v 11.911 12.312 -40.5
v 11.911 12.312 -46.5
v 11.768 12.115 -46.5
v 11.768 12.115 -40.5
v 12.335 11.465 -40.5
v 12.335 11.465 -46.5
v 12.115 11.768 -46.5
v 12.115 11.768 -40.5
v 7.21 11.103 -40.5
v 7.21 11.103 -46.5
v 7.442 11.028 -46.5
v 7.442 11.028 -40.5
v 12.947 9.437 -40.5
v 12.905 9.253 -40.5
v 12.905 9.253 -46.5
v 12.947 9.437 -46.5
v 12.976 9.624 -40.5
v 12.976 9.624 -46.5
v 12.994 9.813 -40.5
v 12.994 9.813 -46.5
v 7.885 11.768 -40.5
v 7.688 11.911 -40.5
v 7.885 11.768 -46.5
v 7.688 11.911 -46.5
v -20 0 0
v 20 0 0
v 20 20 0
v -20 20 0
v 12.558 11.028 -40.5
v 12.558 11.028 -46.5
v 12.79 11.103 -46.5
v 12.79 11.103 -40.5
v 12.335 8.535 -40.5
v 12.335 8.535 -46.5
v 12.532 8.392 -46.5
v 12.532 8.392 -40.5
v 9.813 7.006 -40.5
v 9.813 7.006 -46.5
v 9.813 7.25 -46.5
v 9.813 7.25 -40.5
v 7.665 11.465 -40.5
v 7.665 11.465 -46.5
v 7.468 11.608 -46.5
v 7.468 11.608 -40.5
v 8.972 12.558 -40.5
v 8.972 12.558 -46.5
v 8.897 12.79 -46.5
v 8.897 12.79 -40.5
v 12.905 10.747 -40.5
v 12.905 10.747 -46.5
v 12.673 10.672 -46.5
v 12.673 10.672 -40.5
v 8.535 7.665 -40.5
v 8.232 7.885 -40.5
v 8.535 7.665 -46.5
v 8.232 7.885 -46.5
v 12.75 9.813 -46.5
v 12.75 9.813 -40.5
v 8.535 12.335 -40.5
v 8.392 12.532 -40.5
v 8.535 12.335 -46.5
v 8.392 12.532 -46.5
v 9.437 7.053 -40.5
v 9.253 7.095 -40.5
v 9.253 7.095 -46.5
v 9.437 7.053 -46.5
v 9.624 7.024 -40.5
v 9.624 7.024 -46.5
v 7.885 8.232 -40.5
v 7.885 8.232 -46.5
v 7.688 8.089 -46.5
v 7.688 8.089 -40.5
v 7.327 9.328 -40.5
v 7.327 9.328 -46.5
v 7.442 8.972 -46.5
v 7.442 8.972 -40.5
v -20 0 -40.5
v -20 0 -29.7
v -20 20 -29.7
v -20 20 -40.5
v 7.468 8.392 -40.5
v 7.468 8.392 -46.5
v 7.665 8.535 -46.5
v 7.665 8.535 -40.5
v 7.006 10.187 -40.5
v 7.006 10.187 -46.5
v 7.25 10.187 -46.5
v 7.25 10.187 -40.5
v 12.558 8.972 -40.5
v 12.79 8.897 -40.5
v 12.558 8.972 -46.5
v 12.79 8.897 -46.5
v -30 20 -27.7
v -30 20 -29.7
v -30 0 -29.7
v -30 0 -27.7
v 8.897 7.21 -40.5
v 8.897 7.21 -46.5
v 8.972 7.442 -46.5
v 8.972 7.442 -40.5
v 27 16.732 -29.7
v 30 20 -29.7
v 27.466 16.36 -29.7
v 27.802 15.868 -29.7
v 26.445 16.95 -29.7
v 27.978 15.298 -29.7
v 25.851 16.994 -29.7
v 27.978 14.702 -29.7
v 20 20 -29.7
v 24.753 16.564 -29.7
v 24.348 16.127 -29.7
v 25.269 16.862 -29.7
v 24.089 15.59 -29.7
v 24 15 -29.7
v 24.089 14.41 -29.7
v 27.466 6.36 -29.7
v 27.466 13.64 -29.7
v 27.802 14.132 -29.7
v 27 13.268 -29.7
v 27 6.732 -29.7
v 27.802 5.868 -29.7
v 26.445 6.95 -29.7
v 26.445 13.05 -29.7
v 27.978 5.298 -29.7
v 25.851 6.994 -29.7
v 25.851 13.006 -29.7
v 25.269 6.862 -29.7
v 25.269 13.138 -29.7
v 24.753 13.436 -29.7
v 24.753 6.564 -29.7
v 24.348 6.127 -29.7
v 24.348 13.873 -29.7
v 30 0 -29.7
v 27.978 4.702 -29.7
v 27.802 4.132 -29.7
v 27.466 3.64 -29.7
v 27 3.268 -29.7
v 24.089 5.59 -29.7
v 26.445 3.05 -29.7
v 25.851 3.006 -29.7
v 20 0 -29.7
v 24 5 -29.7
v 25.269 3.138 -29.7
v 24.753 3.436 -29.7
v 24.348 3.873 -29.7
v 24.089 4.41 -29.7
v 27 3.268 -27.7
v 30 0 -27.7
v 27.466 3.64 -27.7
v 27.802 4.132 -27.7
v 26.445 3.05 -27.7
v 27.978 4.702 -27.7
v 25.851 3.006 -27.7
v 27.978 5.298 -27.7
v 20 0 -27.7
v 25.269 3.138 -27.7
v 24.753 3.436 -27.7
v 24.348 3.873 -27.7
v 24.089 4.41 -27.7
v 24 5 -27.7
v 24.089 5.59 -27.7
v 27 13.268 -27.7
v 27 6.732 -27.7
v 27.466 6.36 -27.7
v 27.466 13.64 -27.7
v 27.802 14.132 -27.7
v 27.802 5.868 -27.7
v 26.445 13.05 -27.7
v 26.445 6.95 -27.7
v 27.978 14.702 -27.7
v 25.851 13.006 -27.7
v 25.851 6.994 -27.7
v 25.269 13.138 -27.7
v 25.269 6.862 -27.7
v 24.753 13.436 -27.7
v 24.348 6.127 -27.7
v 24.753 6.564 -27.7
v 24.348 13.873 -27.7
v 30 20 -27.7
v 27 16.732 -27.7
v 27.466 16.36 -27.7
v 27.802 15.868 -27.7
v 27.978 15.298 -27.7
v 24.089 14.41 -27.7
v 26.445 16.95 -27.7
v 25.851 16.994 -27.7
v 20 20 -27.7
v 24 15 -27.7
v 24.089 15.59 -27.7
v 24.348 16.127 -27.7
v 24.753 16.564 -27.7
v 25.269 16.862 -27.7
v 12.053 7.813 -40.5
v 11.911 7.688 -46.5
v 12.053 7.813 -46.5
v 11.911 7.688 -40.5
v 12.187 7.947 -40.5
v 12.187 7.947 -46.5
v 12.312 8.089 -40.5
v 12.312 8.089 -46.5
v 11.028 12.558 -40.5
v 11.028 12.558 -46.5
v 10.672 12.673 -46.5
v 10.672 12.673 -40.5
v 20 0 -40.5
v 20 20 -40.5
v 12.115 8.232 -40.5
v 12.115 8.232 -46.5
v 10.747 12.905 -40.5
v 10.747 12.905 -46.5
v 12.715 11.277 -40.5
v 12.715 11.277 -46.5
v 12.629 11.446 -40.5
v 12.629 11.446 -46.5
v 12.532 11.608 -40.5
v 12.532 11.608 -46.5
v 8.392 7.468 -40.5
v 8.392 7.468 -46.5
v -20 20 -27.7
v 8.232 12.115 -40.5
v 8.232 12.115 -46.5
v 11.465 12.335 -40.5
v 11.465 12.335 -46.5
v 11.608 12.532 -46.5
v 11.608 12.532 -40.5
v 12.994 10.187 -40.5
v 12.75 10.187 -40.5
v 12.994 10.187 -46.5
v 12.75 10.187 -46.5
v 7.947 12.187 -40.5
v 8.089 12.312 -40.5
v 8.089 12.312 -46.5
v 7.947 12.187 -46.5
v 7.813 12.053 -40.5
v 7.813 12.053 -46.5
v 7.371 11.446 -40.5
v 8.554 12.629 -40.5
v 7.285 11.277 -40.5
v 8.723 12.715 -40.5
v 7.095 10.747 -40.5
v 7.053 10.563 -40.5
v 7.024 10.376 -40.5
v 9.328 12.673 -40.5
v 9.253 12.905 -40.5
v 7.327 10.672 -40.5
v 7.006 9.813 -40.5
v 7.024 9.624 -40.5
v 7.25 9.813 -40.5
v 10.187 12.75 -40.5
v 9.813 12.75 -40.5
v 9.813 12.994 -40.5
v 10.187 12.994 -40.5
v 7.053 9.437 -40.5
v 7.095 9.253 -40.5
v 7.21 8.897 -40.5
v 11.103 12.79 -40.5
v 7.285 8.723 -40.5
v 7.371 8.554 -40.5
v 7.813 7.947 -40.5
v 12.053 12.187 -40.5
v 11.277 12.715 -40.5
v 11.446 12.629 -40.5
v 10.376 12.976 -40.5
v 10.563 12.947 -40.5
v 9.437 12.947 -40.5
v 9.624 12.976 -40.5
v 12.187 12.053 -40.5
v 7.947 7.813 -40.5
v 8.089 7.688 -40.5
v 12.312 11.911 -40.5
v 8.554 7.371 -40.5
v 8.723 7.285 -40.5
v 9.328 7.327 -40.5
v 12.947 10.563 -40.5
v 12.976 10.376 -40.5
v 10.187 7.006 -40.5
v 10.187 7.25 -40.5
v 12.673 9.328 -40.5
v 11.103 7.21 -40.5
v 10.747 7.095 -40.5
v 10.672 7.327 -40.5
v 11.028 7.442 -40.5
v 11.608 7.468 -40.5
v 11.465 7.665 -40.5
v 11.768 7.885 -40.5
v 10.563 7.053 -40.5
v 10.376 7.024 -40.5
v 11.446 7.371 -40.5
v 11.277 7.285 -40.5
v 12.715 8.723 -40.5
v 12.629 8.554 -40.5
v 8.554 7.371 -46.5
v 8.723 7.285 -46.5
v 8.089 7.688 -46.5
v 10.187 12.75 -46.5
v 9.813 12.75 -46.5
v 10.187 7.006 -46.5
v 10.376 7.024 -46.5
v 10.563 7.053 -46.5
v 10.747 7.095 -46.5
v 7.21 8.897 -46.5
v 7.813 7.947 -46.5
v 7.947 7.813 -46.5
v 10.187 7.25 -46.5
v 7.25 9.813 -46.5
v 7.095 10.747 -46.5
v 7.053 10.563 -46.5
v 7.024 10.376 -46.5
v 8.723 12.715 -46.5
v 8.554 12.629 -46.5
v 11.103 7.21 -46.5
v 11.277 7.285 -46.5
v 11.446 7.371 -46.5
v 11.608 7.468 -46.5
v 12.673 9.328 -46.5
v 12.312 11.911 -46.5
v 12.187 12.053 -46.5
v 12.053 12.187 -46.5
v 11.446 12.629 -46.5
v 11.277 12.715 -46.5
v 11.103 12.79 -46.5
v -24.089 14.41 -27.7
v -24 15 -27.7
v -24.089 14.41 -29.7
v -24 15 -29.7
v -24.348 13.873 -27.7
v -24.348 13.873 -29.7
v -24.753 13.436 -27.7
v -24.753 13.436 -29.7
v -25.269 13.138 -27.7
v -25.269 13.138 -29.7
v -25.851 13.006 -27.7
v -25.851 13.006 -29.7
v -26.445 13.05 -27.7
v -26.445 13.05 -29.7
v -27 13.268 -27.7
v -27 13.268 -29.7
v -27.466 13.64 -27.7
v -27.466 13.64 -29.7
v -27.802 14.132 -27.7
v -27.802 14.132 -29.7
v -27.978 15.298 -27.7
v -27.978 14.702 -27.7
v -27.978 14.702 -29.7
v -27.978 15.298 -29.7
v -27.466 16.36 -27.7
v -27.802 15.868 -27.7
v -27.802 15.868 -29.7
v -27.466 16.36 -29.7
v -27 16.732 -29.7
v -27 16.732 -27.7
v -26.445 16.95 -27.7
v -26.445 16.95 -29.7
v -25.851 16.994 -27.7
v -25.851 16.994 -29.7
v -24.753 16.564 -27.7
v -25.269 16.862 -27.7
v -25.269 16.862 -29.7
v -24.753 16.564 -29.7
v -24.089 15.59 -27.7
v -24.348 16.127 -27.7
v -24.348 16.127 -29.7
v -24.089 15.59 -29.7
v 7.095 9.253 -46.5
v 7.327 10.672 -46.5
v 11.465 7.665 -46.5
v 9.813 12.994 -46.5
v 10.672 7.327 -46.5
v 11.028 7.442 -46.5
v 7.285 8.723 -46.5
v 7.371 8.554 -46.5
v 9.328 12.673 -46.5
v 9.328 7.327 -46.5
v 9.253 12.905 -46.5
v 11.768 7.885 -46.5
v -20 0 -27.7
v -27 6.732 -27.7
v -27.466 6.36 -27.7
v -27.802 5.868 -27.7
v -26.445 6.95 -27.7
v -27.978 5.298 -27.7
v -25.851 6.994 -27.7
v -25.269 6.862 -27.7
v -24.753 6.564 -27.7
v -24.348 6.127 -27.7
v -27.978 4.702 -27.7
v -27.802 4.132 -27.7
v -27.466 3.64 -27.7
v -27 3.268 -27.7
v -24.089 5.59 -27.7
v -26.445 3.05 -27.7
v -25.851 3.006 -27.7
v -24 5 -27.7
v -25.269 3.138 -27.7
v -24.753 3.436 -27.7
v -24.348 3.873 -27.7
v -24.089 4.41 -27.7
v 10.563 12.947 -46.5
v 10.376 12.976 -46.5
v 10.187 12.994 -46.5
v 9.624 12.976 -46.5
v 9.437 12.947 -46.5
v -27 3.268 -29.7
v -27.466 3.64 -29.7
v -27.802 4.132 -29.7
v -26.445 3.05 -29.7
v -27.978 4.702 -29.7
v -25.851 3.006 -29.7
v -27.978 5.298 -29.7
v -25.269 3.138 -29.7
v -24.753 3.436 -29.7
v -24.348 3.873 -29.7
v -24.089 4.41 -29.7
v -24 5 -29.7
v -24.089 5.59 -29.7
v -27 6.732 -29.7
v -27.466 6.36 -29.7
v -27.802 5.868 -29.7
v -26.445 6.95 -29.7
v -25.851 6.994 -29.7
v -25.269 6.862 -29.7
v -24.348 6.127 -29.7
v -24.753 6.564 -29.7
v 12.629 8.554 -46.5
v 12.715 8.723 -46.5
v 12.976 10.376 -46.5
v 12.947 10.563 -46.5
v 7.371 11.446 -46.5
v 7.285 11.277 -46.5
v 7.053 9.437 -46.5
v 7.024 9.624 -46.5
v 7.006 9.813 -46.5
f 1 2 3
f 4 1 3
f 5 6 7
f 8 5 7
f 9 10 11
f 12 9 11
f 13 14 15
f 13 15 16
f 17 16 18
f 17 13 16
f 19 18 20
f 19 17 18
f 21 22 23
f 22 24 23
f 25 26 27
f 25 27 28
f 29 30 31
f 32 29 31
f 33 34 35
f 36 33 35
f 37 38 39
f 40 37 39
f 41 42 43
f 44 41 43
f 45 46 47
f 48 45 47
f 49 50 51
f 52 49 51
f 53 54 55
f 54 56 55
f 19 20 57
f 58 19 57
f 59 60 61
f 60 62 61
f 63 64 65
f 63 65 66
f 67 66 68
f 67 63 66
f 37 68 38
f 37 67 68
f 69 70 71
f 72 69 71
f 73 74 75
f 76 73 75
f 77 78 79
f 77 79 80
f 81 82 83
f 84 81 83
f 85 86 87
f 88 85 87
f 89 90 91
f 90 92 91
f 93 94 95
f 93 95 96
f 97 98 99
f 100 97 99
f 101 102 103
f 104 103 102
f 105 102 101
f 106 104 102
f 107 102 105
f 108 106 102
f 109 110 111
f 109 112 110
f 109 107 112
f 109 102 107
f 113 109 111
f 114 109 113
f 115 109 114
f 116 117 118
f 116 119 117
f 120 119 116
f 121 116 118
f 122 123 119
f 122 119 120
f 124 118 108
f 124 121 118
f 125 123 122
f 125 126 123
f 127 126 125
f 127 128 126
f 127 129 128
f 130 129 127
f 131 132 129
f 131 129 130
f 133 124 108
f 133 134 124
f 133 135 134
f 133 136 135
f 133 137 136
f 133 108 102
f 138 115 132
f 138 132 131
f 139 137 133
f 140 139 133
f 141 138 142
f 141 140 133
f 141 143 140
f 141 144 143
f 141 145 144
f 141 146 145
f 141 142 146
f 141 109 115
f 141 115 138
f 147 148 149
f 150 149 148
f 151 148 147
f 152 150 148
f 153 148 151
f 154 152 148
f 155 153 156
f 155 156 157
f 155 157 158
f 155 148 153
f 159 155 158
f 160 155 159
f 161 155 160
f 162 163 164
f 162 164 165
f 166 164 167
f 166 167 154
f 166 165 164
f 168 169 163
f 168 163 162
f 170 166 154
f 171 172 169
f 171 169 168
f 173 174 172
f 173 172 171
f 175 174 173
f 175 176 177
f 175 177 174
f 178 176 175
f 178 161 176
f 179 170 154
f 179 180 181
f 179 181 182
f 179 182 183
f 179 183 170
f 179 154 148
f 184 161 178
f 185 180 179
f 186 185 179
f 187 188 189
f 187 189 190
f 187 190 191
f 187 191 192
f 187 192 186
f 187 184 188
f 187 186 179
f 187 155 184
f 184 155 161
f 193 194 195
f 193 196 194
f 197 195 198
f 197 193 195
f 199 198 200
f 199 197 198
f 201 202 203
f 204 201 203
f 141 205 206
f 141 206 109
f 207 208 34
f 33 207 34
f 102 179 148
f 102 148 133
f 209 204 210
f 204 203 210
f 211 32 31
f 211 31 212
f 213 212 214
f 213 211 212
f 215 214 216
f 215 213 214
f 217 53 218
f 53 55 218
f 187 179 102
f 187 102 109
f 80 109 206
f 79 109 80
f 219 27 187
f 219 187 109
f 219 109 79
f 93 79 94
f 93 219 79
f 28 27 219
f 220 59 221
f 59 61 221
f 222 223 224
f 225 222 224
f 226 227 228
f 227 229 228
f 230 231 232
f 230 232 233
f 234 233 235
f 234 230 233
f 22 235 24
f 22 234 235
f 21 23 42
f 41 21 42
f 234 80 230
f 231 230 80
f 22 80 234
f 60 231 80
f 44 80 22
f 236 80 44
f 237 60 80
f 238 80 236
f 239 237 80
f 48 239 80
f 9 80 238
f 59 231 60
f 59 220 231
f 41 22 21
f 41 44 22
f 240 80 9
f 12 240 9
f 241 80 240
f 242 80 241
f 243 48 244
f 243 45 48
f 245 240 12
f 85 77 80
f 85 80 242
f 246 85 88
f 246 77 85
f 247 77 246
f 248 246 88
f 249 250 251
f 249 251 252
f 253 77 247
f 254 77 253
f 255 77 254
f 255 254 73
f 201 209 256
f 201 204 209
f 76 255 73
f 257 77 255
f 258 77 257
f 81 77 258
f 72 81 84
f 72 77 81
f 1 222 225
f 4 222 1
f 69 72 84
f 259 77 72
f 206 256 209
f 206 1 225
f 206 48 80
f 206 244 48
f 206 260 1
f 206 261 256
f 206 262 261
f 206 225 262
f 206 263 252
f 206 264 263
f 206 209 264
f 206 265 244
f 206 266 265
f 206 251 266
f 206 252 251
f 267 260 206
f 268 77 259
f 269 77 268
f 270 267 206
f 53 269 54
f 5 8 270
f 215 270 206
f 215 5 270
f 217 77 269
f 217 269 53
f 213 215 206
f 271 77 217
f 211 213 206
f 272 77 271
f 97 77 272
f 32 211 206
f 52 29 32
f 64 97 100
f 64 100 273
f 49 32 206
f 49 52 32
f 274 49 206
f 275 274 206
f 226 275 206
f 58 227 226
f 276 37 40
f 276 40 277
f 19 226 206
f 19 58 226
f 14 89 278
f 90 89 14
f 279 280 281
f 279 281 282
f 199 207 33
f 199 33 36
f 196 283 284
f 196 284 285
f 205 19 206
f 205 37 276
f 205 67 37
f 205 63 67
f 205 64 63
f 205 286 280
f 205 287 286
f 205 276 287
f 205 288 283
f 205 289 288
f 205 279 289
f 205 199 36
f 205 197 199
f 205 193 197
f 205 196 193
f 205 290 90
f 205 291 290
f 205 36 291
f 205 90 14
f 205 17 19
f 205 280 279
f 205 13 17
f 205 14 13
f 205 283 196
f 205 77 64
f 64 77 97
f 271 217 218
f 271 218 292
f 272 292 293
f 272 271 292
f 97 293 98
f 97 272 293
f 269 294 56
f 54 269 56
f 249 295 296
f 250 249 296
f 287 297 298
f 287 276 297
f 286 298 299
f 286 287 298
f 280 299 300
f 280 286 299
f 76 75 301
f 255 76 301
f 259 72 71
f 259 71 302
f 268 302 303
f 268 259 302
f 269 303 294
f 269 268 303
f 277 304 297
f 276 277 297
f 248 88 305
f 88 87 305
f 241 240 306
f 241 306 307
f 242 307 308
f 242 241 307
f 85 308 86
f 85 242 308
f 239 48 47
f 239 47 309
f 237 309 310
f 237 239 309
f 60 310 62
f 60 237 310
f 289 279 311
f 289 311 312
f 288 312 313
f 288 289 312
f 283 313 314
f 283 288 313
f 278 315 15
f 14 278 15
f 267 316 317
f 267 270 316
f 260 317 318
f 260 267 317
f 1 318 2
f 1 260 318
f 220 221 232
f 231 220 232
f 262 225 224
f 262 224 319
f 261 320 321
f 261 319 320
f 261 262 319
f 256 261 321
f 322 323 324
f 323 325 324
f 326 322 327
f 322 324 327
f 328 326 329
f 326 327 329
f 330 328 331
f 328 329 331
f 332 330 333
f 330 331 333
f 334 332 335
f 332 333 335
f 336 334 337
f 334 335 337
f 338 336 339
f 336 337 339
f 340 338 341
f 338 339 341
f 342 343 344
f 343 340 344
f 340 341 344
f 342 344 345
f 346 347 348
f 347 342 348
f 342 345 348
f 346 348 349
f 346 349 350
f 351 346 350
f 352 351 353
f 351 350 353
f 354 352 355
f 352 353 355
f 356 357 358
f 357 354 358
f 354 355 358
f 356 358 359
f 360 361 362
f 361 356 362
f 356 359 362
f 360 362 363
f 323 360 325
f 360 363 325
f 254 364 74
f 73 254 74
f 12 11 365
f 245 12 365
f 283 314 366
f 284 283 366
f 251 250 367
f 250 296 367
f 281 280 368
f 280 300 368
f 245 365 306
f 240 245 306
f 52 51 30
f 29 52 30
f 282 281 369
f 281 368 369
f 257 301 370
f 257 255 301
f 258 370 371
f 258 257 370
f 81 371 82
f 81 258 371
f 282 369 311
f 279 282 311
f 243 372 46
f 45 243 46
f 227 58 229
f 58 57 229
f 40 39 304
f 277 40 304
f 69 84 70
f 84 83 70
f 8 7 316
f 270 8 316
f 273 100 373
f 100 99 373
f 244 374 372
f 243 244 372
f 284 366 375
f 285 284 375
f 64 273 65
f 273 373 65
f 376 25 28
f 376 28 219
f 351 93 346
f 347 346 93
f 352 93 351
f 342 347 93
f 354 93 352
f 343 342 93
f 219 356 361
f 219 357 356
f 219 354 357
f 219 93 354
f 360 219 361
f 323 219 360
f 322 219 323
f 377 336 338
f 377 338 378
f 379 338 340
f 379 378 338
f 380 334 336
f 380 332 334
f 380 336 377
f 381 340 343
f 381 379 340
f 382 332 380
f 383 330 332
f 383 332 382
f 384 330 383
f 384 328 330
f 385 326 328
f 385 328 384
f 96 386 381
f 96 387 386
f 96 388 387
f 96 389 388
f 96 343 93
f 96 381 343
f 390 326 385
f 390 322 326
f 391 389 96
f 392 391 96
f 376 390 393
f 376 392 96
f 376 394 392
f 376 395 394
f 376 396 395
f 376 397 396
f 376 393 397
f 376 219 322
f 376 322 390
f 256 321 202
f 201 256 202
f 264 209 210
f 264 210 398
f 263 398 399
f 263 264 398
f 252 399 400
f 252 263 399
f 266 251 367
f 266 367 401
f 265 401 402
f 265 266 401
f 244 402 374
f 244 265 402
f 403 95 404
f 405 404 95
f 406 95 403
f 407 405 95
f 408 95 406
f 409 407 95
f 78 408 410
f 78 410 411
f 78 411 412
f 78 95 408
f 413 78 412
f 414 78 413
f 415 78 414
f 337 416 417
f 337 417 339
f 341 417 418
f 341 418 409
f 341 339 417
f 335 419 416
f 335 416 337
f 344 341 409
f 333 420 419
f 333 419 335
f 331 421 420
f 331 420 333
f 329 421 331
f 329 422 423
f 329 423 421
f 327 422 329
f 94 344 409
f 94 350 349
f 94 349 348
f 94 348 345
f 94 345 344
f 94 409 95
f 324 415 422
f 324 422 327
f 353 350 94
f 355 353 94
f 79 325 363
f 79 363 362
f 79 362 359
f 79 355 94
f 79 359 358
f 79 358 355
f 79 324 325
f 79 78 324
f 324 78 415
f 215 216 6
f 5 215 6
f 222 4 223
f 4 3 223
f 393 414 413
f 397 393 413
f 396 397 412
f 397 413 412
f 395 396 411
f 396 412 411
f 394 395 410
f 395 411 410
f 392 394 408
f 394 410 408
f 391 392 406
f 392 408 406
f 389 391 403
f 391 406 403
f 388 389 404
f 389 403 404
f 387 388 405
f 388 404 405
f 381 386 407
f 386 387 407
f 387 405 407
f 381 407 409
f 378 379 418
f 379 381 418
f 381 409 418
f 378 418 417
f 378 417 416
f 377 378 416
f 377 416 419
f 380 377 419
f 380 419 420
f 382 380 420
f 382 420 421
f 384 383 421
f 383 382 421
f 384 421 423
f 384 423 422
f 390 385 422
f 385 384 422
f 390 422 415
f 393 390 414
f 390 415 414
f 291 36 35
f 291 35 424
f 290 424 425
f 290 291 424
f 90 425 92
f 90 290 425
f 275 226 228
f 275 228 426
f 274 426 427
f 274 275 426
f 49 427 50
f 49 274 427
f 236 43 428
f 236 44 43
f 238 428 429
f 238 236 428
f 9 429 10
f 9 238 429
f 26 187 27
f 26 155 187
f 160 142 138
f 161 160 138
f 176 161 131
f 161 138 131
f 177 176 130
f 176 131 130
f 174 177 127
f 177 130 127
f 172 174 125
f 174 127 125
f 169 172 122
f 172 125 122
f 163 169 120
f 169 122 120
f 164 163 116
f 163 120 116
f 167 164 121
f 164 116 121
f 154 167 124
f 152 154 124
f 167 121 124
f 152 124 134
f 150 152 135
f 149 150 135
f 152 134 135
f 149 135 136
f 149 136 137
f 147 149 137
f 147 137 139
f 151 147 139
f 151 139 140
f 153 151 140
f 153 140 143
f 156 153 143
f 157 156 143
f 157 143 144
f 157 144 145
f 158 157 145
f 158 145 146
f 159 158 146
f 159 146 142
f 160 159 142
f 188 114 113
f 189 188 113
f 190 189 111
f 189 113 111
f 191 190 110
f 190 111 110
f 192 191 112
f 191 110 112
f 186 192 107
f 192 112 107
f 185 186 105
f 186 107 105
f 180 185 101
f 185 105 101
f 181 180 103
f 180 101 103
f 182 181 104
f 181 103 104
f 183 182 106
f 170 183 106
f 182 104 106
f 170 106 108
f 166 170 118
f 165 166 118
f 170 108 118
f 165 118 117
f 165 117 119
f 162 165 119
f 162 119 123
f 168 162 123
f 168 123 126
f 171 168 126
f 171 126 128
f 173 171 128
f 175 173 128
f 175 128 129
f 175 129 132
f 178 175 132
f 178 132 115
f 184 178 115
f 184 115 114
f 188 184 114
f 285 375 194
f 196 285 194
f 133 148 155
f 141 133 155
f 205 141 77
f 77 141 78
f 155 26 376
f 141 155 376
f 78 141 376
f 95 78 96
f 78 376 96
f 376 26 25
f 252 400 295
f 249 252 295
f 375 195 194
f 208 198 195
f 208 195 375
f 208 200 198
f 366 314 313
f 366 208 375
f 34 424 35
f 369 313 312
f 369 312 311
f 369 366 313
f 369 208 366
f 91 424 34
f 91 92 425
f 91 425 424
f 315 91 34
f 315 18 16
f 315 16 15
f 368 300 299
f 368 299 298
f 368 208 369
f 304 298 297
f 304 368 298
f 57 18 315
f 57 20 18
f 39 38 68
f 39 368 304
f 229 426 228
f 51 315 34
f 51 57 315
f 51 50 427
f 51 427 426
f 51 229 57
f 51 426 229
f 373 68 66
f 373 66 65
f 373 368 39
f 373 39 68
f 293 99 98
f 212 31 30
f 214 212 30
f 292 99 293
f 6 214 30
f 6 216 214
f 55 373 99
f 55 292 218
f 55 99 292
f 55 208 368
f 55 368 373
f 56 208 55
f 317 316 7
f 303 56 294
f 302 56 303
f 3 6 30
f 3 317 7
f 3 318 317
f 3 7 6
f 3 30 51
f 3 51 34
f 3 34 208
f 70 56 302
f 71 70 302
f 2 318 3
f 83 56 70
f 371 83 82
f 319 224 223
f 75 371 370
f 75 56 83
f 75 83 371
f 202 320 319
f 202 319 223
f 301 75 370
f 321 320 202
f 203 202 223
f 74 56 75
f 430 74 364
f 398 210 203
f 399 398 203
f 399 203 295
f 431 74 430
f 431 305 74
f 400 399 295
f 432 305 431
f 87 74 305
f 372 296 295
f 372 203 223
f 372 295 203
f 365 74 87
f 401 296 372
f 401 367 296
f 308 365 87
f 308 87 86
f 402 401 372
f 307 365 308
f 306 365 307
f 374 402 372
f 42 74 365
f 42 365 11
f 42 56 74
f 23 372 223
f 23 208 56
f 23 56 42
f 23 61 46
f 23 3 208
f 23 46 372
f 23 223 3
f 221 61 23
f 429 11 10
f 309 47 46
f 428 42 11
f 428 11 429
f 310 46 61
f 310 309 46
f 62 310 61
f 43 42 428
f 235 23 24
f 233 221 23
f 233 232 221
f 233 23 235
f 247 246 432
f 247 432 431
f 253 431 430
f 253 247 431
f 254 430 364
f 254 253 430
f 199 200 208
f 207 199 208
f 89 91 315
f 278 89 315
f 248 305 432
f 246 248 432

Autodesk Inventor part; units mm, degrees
ref_plane "YZ Plane" through (0, 0, 0) normal (1, 0, 0) x (0, 1, 0)
ref_plane "XZ Plane" through (0, 0, 0) normal (0, 1, 0) x (-1, 0, 0)
ref_plane "XY Plane" through (0, 0, 0) normal (0, 0, 1) x (1, 0, 0)
sketch "Sketch1" plane through (0, 0, 0) normal (0, 1, 0) x (-1, 0, 0)
  line L0 (-20, 0) -> (20, 0)
  line L1 (20, 0) -> (20, -40.5)
  line L2 (20, -40.5) -> (-20, -40.5)
  line L3 (-20, -40.5) -> (-20, 0)
  point P0 (0, 0)
  point P1 (0, -40.5)
  dimension "d0" = 40
  dimension "d1" = 40.5
extrude "Extrusion1" add sketch "Sketch1" along normal blind 20
sketch "Sketch2" plane through (20, 0, 0) normal (1, 0, 0) x (0, 0, -1)
  line L0 (27.7, 20) -> (29.7, 20)
  line L1 (29.7, 20) -> (29.7, 0)
  line L2 (29.7, 0) -> (27.7, 0)
  line L3 (27.7, 0) -> (27.7, 20)
  line L4 (40.5, 0) -> (40.5, 20) projected
  line L5 (0, 0) -> (0, 20) projected
  dimension "d4" = 2
  dimension "d31" = 27.7
extrude "Extrusion2" add sketch "Sketch2" along normal blind 10
sketch "Sketch3" plane through (20, 0, -29.7) normal (0, 0, -1) x (-1, 0, 0)
  circle A0 centre (-6, 15) radius 2
  line L0 (-10, 20) -> (-10, 0) projected
  line L1 (-10, 10) -> (0, 10)
  circle A1 centre (-6, 5) radius 2
  point P0 (20, 0)
  point P1 (-10, 5)
  point P2 (-8, 3.2679)
  dimension "d9" = 4
  dimension "d13" = 5
  dimension "d32" = 4
extrude "Extrusion3" cut sketch "Sketch3" against normal up to next
sketch "Sketch4" plane through (20, 0, -40.5) normal (0, 0, -1) x (-1, 0, 0)
  circle A0 centre (10, 10) radius 3
  line L0 (0, 0) -> (0, 20) projected
  line L1 (0, 20) -> (40, 20) projected
  point P0 (20, 0)
  dimension "d16" = 6
  dimension "d17" = 10
  dimension "d18" = 10
extrude "Extrusion4" add sketch "Sketch4" along normal blind 6
sketch "Sketch5" plane through (10, 10, -46.5) normal (0, 0, -1) x (-1, 0, 0)
  circle A0 centre (0, 0) radius 3 projected
  line L0 (2.75, -0.1872) -> (3.25, -0.1872)
  line L1 (3.25, -0.1872) -> (3.25, 0.1872)
  line L2 (3.25, 0.1872) -> (2.75, 0.1872)
  line L3 (2.75, 0.1872) -> (2.75, -0.1872)
  line L4 (2.75, -0.1872) -> (3.25, 0.1872) construction
  line L5 (3.25, -0.1872) -> (2.75, 0.1872) construction
  line L6 (2.5575, 1.0279) -> (2.6733, 0.6717)
  line L7 (3.0331, 1.1824) -> (2.5575, 1.0279)
  line L8 (3.1488, 0.8262) -> (3.0331, 1.1824)
  line L9 (2.6733, 0.6717) -> (3.1488, 0.8262)
  line L10 (2.1147, 1.7679) -> (2.3348, 1.4649)
  line L11 (2.5193, 2.0618) -> (2.1147, 1.7679)
  line L12 (2.7394, 1.7588) -> (2.5193, 2.0618)
  line L13 (2.3348, 1.4649) -> (2.7394, 1.7588)
  line L14 (1.4649, 2.3348) -> (1.7679, 2.1147)
  line L15 (1.7588, 2.7394) -> (1.4649, 2.3348)
  line L16 (2.0618, 2.5193) -> (1.7588, 2.7394)
  line L17 (1.7679, 2.1147) -> (2.0618, 2.5193)
  line L18 (0.6717, 2.6733) -> (1.0279, 2.5575)
  line L19 (0.8262, 3.1488) -> (0.6717, 2.6733)
  line L20 (1.1824, 3.0331) -> (0.8262, 3.1488)
  line L21 (1.0279, 2.5575) -> (1.1824, 3.0331)
  line L22 (-0.1872, 2.75) -> (0.1872, 2.75)
  line L23 (-0.1872, 3.25) -> (-0.1872, 2.75)
  line L24 (0.1872, 3.25) -> (-0.1872, 3.25)
  line L25 (0.1872, 2.75) -> (0.1872, 3.25)
  line L26 (-1.0279, 2.5575) -> (-0.6717, 2.6733)
  line L27 (-1.1824, 3.0331) -> (-1.0279, 2.5575)
  line L28 (-0.8262, 3.1488) -> (-1.1824, 3.0331)
  line L29 (-0.6717, 2.6733) -> (-0.8262, 3.1488)
  line L30 (-1.7679, 2.1147) -> (-1.4649, 2.3348)
  line L31 (-2.0618, 2.5193) -> (-1.7679, 2.1147)
  line L32 (-1.7588, 2.7394) -> (-2.0618, 2.5193)
  line L33 (-1.4649, 2.3348) -> (-1.7588, 2.7394)
  line L34 (-2.3348, 1.4649) -> (-2.1147, 1.7679)
  line L35 (-2.7394, 1.7588) -> (-2.3348, 1.4649)
  line L36 (-2.5193, 2.0618) -> (-2.7394, 1.7588)
  line L37 (-2.1147, 1.7679) -> (-2.5193, 2.0618)
  line L38 (-2.6733, 0.6717) -> (-2.5575, 1.0279)
  line L39 (-3.1488, 0.8262) -> (-2.6733, 0.6717)
  line L40 (-3.0331, 1.1824) -> (-3.1488, 0.8262)
  line L41 (-2.5575, 1.0279) -> (-3.0331, 1.1824)
  line L42 (-2.75, -0.1872) -> (-2.75, 0.1872)
  line L43 (-3.25, -0.1872) -> (-2.75, -0.1872)
  line L44 (-3.25, 0.1872) -> (-3.25, -0.1872)
  line L45 (-2.75, 0.1872) -> (-3.25, 0.1872)
  line L46 (-2.5575, -1.0279) -> (-2.6733, -0.6717)
  line L47 (-3.0331, -1.1824) -> (-2.5575, -1.0279)
  line L48 (-3.1488, -0.8262) -> (-3.0331, -1.1824)
  line L49 (-2.6733, -0.6717) -> (-3.1488, -0.8262)
  line L50 (-2.1147, -1.7679) -> (-2.3348, -1.4649)
  line L51 (-2.5193, -2.0618) -> (-2.1147, -1.7679)
  line L52 (-2.7394, -1.7588) -> (-2.5193, -2.0618)
  line L53 (-2.3348, -1.4649) -> (-2.7394, -1.7588)
  line L54 (-1.4649, -2.3348) -> (-1.7679, -2.1147)
  line L55 (-1.7588, -2.7394) -> (-1.4649, -2.3348)
  line L56 (-2.0618, -2.5193) -> (-1.7588, -2.7394)
  line L57 (-1.7679, -2.1147) -> (-2.0618, -2.5193)
  line L58 (-0.6717, -2.6733) -> (-1.0279, -2.5575)
  line L59 (-0.8262, -3.1488) -> (-0.6717, -2.6733)
  line L60 (-1.1824, -3.0331) -> (-0.8262, -3.1488)
  line L61 (-1.0279, -2.5575) -> (-1.1824, -3.0331)
  line L62 (0.1872, -2.75) -> (-0.1872, -2.75)
  line L63 (0.1872, -3.25) -> (0.1872, -2.75)
  line L64 (-0.1872, -3.25) -> (0.1872, -3.25)
  line L65 (-0.1872, -2.75) -> (-0.1872, -3.25)
  line L66 (1.0279, -2.5575) -> (0.6717, -2.6733)
  line L67 (1.1824, -3.0331) -> (1.0279, -2.5575)
  line L68 (0.8262, -3.1488) -> (1.1824, -3.0331)
  line L69 (0.6717, -2.6733) -> (0.8262, -3.1488)
  line L70 (1.7679, -2.1147) -> (1.4649, -2.3348)
  line L71 (2.0618, -2.5193) -> (1.7679, -2.1147)
  line L72 (1.7588, -2.7394) -> (2.0618, -2.5193)
  line L73 (1.4649, -2.3348) -> (1.7588, -2.7394)
  line L74 (2.3348, -1.4649) -> (2.1147, -1.7679)
  line L75 (2.7394, -1.7588) -> (2.3348, -1.4649)
  line L76 (2.5193, -2.0618) -> (2.7394, -1.7588)
  line L77 (2.1147, -1.7679) -> (2.5193, -2.0618)
  line L78 (2.6733, -0.6717) -> (2.5575, -1.0279)
  line L79 (3.1488, -0.8262) -> (2.6733, -0.6717)
  line L80 (3.0331, -1.1824) -> (3.1488, -0.8262)
  line L81 (2.5575, -1.0279) -> (3.0331, -1.1824)
  point P0 (10, -10)
  point P1 (3, 0)
  dimension "d21" = 0.5
  dimension "d24" = 360
extrude "Extrusion5" cut sketch "Sketch5" against normal up to surface (6 mm away) contours A0 L0 L3 L2 | A0 L2 L1 L0
pattern_circular "Circular Pattern1" count 20 over 360 about axis through (10, 10, -46.5) along (0, 0, -1) of "Extrusion5"
mirror "Mirror1" about plane through (0, 0, 0) normal (1, 0, 0) of "Extrusion2", "Extrusion3"
properties part number "Servo" material "PLA"
